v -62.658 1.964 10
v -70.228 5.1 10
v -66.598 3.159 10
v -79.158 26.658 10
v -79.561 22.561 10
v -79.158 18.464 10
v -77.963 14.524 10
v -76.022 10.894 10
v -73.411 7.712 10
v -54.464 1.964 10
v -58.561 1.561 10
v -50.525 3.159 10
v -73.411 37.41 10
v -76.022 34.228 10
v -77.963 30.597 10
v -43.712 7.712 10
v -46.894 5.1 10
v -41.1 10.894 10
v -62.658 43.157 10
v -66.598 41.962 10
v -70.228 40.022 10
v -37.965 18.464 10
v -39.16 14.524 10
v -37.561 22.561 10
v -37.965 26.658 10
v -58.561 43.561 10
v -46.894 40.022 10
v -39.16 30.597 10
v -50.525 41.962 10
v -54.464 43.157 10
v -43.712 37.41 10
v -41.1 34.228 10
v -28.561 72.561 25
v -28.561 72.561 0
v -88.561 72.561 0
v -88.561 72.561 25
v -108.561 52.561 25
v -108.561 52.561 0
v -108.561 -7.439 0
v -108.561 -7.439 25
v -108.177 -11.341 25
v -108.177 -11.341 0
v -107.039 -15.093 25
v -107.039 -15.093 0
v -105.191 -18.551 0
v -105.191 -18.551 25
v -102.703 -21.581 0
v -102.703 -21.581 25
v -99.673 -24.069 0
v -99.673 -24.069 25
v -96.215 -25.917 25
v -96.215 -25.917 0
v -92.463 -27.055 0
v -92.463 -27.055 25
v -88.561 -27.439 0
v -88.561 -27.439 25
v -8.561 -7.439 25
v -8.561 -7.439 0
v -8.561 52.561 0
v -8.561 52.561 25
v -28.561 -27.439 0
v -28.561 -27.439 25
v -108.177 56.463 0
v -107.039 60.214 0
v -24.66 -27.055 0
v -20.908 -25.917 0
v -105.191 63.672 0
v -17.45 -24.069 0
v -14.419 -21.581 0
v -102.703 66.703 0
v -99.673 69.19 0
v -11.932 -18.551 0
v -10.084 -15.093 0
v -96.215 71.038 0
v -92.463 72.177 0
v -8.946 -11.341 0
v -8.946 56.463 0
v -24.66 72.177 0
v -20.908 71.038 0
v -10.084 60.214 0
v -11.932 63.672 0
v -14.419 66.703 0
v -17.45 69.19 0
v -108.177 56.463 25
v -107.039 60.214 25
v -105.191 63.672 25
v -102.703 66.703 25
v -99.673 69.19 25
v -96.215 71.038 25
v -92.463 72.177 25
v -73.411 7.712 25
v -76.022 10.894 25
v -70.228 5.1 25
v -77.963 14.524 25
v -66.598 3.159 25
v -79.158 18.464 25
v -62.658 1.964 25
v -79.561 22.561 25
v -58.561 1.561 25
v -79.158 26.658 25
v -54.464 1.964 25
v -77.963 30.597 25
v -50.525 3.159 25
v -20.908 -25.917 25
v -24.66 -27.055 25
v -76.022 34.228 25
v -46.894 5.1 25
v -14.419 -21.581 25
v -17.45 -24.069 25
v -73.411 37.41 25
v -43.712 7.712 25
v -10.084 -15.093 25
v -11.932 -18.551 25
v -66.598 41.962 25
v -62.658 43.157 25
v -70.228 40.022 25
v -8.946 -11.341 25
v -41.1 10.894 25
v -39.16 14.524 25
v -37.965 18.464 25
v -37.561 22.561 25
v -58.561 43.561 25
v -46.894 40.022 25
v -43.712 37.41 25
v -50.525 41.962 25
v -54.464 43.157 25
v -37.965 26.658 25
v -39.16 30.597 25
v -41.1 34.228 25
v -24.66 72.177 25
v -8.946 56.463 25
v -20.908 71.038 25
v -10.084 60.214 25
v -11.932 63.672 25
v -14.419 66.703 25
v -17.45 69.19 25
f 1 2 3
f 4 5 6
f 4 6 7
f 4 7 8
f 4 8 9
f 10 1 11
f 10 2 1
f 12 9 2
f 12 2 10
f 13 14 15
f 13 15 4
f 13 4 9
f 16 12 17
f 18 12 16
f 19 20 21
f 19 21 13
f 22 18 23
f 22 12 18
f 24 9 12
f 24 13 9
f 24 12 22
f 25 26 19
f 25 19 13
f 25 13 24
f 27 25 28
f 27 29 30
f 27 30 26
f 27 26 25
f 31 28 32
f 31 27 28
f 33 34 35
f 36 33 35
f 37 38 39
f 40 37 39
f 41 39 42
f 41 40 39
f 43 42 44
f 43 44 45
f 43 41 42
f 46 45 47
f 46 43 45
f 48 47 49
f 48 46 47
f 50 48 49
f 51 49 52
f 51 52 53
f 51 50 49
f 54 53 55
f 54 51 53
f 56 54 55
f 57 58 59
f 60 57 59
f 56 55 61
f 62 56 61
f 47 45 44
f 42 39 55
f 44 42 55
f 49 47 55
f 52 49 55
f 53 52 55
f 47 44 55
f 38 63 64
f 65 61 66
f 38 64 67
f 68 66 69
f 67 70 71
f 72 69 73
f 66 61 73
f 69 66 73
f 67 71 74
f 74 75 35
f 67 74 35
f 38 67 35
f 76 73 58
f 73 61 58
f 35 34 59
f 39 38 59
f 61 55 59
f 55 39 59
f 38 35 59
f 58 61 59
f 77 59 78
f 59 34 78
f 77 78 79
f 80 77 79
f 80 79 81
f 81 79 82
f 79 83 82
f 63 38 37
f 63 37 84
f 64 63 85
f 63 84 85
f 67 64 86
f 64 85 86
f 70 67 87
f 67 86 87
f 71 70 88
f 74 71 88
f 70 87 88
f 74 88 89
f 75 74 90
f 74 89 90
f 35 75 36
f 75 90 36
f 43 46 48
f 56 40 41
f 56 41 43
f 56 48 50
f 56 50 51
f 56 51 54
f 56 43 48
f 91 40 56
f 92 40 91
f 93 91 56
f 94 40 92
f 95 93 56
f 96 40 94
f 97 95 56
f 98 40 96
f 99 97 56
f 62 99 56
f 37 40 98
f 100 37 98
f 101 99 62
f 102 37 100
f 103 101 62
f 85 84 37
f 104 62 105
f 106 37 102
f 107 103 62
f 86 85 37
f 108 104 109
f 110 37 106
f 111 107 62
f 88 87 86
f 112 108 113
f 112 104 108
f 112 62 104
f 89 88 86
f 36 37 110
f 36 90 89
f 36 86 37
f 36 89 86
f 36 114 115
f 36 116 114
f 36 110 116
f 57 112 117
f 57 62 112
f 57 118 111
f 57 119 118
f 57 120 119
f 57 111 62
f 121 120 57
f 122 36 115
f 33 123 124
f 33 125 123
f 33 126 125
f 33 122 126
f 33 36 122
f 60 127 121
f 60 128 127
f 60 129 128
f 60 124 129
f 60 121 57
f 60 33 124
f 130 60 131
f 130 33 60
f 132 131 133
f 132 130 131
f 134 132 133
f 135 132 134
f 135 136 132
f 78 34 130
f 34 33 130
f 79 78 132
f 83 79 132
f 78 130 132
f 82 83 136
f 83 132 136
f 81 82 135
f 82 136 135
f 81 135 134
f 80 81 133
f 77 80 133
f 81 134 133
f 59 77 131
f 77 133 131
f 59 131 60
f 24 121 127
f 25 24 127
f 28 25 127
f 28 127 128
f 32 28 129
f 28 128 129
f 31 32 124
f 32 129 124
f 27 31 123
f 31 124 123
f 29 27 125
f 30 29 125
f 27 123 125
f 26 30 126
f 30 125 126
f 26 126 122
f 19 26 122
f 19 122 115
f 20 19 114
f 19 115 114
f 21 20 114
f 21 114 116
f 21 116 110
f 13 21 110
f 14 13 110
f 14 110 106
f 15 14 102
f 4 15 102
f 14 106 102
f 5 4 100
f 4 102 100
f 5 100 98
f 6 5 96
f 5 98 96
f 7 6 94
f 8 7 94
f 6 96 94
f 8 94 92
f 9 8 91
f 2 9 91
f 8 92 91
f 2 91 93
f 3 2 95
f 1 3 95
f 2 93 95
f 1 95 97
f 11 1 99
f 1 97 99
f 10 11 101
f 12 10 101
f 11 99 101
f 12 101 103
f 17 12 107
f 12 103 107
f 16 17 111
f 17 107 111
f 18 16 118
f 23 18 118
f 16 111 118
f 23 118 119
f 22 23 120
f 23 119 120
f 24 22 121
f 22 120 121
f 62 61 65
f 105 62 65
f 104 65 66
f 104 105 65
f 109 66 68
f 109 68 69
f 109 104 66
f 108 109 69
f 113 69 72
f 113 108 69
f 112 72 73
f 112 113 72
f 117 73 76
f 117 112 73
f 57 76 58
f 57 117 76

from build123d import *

# Parameters (mm, degrees)
F1_DEPTH = 25
F2_R     = 21
F3_DEPTH = 15
F4_R     = 20
F5_R     = 20
F6_R     = 20


with BuildPart() as f1:
    # F0 (on Top) → F1 (new body)
    with BuildSketch(Plane.XY):
        Polygon((-58.561329, 22.560807), (-108.561329, 72.560807), (-108.561329, -27.439193), align=None)
        Polygon((-8.561329, 72.560807), (-108.561329, 72.560807), (-58.561329, 22.560807), align=None)
        Polygon((-8.561329, -27.439193), (-8.561329, 72.560807), (-58.561329, 22.560807), align=None)
        Polygon((-58.561329, 22.560807), (-108.561329, -27.439193), (-8.561329, -27.439193), align=None)
    extrude(amount=F1_DEPTH)

    # F2 (on face) → F3 (cut)
    with BuildSketch(Plane.XY.offset(25)):
        with Locations((-58.561329, 22.560807)):
            Circle(F2_R)
    extrude(amount=-F3_DEPTH, mode=Mode.SUBTRACT)

    # F4
    f4_edges = [f1.edges().sort_by_distance(p)[0] for p in [
        (-108.561329, -27.439193, 12.5),
    ]]
    fillet(f4_edges, radius=F4_R)

    # F5
    f5_edges = [f1.edges().sort_by_distance(p)[0] for p in [
        (-108.561329, 72.560807, 12.5),
    ]]
    fillet(f5_edges, radius=F5_R)

    # F6
    f6_edges = [f1.edges().sort_by_distance(p)[0] for p in [
        (-8.561329, 72.560807, 12.5),
        (-8.561329, -27.439193, 12.5),
    ]]
    fillet(f6_edges, radius=F6_R)


solid = f1.part
